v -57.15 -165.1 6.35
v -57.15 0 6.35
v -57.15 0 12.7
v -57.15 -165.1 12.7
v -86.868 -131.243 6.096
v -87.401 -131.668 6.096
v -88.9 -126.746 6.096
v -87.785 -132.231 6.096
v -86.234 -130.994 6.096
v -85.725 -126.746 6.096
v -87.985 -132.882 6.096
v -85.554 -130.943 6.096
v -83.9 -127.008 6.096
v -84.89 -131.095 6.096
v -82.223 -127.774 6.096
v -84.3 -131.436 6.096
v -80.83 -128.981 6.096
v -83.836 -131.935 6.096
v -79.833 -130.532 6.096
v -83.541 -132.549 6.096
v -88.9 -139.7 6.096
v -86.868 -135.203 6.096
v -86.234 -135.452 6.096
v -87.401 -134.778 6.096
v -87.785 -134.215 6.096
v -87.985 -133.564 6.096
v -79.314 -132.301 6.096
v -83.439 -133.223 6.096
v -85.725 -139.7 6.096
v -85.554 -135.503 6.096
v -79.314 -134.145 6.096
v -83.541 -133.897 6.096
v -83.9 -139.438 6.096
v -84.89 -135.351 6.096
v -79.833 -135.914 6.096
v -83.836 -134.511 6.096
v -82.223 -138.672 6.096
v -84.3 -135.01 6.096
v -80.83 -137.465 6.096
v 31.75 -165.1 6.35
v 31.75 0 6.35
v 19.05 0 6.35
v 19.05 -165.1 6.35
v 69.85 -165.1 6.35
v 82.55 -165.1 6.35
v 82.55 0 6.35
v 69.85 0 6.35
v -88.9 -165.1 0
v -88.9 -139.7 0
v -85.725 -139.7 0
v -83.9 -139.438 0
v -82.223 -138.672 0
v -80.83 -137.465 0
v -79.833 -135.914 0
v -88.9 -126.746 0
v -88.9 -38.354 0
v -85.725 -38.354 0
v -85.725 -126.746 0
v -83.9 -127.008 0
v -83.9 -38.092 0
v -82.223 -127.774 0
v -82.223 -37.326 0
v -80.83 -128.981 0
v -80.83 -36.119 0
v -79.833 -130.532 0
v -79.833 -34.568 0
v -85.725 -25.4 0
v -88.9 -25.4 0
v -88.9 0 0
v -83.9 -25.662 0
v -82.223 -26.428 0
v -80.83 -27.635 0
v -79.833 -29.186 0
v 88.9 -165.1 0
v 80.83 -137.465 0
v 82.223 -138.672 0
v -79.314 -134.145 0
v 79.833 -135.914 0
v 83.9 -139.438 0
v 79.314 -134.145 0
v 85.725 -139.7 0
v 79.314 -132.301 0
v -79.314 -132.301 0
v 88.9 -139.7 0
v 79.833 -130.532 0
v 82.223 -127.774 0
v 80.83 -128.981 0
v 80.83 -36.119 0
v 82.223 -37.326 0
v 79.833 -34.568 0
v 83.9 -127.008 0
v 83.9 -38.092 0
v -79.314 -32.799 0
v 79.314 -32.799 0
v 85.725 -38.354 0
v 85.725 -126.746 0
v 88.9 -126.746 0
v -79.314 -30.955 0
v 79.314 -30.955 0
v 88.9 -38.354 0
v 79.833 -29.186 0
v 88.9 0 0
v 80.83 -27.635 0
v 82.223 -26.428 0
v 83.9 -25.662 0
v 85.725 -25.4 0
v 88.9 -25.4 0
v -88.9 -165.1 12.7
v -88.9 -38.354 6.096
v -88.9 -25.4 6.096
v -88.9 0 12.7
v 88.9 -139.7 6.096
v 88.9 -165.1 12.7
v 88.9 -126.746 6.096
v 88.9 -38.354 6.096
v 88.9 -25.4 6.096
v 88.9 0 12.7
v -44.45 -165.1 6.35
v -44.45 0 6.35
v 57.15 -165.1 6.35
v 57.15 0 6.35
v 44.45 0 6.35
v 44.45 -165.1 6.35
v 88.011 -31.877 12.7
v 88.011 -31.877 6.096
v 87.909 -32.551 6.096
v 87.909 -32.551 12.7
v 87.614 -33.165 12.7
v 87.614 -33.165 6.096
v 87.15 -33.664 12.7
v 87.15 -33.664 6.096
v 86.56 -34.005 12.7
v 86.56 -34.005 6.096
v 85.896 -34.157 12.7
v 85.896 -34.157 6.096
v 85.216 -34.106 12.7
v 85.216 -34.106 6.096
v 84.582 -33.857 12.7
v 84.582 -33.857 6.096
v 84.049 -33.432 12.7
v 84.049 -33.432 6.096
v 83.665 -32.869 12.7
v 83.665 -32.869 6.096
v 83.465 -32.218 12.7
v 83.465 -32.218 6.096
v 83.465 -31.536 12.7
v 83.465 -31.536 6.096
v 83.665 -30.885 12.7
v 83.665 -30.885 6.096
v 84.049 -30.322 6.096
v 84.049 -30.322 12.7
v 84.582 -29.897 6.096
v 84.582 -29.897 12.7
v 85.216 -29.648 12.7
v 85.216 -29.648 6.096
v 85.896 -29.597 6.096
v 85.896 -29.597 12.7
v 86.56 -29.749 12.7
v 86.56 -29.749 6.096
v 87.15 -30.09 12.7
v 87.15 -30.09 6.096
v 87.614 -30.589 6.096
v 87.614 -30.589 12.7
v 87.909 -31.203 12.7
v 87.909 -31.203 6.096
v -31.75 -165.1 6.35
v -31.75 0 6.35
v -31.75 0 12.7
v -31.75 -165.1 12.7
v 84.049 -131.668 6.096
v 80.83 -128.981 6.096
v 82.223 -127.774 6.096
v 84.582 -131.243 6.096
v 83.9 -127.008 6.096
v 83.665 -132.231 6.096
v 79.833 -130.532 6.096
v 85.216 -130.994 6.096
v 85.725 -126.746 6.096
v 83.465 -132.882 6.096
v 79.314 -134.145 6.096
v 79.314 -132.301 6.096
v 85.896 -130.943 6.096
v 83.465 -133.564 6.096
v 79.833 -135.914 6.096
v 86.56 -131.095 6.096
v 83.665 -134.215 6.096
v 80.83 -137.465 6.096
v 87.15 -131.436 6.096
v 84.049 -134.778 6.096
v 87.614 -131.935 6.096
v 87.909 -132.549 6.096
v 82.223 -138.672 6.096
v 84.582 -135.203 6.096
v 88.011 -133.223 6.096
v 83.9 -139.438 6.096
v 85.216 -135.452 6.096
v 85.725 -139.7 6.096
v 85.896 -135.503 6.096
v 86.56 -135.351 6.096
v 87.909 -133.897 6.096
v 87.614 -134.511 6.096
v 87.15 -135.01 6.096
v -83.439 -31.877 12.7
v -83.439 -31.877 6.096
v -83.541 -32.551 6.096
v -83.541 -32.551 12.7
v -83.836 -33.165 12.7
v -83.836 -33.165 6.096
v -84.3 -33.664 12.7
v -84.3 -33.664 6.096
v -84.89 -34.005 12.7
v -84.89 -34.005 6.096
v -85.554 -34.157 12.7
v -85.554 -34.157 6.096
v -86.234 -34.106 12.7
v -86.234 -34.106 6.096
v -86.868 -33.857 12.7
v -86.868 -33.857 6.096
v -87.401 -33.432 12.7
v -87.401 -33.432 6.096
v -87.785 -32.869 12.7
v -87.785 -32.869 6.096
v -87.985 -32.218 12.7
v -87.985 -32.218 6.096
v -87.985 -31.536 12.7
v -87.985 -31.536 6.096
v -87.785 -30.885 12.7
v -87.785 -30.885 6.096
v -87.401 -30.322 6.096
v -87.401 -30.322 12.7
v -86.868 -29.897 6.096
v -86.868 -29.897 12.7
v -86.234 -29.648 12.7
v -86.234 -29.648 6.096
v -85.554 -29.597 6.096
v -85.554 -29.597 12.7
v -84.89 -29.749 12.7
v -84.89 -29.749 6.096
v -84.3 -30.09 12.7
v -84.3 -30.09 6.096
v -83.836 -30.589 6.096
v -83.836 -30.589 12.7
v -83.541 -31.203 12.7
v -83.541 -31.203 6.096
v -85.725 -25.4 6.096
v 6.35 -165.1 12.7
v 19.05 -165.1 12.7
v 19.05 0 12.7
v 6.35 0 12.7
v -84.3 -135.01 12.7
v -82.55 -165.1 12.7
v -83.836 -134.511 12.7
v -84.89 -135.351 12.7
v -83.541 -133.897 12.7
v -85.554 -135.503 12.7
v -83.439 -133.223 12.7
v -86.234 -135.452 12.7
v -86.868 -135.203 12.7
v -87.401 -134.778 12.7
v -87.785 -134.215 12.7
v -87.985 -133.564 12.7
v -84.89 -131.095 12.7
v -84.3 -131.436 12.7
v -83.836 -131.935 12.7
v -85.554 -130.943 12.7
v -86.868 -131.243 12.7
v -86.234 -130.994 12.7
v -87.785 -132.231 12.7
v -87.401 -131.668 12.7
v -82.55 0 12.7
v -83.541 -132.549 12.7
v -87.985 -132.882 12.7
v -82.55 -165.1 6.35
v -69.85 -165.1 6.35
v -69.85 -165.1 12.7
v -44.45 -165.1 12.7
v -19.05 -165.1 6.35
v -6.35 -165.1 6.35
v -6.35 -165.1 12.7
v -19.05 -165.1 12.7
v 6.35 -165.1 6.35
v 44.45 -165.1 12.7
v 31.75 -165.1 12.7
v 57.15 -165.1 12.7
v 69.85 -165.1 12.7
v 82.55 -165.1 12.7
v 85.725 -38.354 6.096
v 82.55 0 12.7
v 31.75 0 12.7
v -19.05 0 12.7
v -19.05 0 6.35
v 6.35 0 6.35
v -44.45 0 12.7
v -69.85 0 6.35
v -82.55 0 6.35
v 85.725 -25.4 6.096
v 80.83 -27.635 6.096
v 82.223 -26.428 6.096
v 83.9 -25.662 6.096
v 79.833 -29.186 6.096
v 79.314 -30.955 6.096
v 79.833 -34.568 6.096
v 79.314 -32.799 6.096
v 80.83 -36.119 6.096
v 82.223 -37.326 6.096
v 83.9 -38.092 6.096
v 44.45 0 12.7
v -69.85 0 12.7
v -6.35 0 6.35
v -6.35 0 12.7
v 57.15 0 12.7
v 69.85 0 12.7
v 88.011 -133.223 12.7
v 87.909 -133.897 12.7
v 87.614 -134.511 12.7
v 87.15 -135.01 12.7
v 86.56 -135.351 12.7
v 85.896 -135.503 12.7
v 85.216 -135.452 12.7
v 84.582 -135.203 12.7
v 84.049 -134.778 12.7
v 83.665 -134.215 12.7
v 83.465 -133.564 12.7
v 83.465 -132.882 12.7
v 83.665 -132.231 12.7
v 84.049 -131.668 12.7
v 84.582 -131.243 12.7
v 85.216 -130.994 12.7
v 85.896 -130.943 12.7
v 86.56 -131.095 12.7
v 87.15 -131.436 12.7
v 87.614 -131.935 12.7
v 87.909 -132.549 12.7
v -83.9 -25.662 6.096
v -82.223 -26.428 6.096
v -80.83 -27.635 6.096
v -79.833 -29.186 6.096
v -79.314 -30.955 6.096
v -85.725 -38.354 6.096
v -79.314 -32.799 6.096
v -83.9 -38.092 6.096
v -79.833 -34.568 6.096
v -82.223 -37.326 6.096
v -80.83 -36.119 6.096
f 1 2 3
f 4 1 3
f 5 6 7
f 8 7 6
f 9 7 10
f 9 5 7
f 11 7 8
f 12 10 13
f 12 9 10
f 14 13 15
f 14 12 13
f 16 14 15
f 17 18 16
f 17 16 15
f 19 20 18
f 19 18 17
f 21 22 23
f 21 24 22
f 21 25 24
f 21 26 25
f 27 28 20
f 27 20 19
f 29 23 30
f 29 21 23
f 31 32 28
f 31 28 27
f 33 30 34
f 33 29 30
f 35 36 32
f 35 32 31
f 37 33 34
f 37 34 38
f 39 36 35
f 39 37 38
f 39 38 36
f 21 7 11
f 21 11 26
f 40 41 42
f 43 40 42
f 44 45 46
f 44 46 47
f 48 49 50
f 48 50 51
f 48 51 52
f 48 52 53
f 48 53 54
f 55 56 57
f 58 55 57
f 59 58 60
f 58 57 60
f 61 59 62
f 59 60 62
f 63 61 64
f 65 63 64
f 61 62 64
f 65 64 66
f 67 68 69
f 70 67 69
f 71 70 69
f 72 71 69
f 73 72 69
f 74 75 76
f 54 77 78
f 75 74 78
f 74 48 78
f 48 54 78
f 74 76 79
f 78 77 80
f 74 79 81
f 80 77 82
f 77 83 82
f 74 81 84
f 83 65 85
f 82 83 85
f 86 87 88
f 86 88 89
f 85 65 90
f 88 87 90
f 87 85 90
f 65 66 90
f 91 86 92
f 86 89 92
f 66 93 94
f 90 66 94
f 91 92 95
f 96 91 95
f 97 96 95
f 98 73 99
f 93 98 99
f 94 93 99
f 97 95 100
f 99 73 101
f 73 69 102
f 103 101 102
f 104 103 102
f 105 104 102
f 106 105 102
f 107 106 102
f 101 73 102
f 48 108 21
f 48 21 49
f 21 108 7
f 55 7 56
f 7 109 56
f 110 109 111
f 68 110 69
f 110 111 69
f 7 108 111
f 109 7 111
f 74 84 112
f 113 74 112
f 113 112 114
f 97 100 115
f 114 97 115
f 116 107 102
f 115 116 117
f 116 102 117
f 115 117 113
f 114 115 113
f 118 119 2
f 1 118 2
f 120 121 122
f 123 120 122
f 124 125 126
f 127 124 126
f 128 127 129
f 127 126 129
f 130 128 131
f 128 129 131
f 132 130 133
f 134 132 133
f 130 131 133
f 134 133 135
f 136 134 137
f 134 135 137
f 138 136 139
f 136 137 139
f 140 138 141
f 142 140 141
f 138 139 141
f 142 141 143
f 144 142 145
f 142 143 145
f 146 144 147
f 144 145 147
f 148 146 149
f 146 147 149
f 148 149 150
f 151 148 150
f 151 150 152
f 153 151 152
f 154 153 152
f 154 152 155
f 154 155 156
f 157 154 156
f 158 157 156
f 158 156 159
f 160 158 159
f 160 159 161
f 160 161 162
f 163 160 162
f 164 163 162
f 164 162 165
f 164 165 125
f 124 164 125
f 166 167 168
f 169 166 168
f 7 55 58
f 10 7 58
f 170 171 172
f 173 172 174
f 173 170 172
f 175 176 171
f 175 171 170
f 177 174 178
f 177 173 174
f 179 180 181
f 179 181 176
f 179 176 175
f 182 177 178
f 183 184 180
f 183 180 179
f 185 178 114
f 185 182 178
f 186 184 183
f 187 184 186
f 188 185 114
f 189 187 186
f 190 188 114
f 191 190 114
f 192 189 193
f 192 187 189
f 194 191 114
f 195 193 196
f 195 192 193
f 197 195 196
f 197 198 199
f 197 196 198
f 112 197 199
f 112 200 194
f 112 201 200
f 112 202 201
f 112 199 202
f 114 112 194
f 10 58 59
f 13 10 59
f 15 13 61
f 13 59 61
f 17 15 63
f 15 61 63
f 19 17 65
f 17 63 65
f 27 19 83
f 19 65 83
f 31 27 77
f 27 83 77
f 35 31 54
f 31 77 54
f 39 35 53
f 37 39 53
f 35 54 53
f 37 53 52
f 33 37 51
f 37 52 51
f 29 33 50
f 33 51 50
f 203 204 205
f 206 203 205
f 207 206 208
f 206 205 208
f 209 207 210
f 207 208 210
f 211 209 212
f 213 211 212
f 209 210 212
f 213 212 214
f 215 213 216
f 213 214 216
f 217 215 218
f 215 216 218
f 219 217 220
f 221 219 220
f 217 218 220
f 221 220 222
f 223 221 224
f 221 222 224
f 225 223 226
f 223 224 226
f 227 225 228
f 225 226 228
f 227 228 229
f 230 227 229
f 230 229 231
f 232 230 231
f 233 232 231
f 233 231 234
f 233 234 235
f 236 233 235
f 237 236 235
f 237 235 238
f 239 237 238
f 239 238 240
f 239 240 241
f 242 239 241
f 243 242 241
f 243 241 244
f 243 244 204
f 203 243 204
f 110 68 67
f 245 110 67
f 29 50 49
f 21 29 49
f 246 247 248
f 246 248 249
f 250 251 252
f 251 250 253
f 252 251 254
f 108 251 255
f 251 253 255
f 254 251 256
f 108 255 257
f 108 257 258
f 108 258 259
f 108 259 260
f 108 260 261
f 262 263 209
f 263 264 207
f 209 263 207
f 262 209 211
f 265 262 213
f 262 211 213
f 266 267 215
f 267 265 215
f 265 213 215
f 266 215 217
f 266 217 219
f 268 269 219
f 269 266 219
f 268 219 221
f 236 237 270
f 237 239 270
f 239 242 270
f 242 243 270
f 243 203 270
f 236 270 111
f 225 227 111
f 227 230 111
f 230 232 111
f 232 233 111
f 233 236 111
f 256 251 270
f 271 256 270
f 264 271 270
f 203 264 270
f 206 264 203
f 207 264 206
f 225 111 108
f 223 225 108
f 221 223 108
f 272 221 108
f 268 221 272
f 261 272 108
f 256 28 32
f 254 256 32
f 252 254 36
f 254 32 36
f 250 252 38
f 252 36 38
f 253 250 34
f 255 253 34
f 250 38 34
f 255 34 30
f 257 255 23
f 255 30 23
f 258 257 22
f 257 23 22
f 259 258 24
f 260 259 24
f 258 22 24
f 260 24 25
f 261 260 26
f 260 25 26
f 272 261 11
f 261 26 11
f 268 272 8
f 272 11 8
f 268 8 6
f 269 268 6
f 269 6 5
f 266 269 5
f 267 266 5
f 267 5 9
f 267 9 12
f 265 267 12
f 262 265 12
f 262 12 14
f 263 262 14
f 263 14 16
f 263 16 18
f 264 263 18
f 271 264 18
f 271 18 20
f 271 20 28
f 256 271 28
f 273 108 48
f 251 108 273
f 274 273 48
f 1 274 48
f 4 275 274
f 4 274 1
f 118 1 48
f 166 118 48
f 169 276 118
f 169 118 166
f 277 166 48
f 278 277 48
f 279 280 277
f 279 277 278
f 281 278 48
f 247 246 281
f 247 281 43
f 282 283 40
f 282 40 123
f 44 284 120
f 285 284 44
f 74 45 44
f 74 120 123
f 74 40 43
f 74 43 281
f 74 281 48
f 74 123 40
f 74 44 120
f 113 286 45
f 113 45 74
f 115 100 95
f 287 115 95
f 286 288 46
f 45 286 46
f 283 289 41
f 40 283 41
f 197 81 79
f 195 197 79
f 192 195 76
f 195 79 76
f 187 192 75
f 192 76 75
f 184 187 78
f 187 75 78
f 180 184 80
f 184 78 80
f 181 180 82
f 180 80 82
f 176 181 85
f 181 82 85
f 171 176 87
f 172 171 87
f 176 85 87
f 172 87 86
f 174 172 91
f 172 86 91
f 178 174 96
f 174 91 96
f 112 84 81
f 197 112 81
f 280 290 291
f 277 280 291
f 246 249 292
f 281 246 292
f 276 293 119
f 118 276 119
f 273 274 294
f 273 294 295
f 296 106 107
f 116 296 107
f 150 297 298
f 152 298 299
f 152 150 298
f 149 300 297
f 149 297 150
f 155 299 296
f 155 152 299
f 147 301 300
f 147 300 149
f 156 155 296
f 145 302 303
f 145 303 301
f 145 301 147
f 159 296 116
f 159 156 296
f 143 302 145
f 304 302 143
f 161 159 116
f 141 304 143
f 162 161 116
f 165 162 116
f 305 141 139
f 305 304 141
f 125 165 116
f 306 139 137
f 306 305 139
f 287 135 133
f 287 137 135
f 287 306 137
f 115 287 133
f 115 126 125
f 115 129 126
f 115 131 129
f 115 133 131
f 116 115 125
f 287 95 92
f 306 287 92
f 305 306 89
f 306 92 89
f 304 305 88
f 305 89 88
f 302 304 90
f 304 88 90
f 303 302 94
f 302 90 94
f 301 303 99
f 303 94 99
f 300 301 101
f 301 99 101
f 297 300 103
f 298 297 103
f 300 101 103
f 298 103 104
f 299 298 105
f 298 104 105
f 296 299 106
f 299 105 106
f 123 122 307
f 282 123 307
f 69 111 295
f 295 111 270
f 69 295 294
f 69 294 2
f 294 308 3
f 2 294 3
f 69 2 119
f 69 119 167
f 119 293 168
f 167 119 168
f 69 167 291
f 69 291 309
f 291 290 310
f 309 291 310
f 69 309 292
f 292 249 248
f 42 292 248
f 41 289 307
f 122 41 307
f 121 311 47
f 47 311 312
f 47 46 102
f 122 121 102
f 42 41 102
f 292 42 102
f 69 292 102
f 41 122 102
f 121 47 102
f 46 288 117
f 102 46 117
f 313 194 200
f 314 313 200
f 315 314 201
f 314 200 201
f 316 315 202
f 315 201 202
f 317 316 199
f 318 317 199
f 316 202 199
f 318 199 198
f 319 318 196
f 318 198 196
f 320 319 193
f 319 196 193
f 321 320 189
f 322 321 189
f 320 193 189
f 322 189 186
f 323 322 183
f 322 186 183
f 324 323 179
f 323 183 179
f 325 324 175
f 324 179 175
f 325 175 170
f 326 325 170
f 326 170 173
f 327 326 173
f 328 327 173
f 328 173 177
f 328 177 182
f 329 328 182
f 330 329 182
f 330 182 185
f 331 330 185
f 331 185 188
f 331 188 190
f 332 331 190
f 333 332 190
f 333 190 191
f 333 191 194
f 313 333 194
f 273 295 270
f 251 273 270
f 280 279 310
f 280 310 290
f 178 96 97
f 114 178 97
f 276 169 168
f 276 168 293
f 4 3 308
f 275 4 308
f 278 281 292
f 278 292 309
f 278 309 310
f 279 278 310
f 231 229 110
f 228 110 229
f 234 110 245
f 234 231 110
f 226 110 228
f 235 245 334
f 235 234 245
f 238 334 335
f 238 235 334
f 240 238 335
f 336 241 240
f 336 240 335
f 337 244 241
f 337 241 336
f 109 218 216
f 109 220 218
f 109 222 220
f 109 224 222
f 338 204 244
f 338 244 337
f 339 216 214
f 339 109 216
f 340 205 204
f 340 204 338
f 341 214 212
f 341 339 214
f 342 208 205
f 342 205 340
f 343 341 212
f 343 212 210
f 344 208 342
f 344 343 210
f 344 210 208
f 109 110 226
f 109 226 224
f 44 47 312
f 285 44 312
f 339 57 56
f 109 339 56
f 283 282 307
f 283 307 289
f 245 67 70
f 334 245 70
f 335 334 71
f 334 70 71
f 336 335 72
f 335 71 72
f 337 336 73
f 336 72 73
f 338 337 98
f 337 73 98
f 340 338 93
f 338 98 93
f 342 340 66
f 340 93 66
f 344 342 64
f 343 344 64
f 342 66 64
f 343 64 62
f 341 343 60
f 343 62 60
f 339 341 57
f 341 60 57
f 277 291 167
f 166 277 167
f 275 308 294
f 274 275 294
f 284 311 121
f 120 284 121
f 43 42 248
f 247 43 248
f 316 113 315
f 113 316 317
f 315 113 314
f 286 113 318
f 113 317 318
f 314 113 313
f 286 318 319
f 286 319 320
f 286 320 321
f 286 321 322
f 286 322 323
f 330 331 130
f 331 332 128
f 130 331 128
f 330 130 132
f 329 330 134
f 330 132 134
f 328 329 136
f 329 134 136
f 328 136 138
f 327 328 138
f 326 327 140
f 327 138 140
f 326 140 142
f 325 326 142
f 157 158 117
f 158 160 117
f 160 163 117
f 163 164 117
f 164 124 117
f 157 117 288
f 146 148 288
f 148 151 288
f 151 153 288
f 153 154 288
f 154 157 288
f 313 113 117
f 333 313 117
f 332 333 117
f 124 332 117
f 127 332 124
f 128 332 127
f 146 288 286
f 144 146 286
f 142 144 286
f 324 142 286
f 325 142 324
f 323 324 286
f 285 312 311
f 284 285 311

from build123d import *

# Parameters (mm, degrees)
F1_DEPTH = 165.1
F3_DEPTH = 6.096
F4_R     = 2.286
F5_DEPTH = 25.4


with BuildPart() as f1:
    # F0 (on Front) → F1 (new body)
    with BuildSketch(Plane.XZ):
        Polygon((-88.9, 12.7), (-88.9, 0), (88.9, 0), (88.9, 6.35), (88.9, 12.7), (82.55, 12.7), (82.55, 6.35), (69.85, 6.35), (69.85, 12.7), (57.15, 12.7), (57.15, 6.35), (44.45, 6.35), (44.45, 12.7), (31.75, 12.7), (31.75, 6.35), (19.05, 6.35), (19.05, 12.7), (6.35, 12.7), (6.35, 6.35), (-6.35, 6.35), (-6.35, 12.7), (-19.05, 12.7), (-19.05, 6.35), (-31.75, 6.35), (-31.75, 12.7), (-44.45, 12.7), (-44.45, 6.35), (-57.15, 6.35), (-57.15, 12.7), (-69.85, 12.7), (-69.85, 6.35), (-82.55, 6.35), (-82.55, 12.7), align=None)
    extrude(amount=F1_DEPTH)

    # F2 (on face) → F3 (cut)
    with BuildSketch(Plane(origin=(0, 0, 0), x_dir=(1, 0, 0), z_dir=(0, 0, -1))):
        with BuildLine():
            Line((85.725, 126.746), (88.9, 126.746))
            Line((88.9, 126.746), (88.9, 139.7))
            Line((88.9, 139.7), (85.725, 139.7))
            ThreePointArc((85.725, 139.7), (79.248, 133.223), (85.725, 126.746))
        make_face()
        with BuildLine():
            Line((88.9, 25.4), (88.9, 38.354))
            Line((88.9, 38.354), (85.725, 38.354))
            ThreePointArc((85.725, 38.354), (79.248, 31.877), (85.725, 25.4))
            Line((85.725, 25.4), (88.9, 25.4))
        make_face()
        with BuildLine():
            Line((-88.9, 139.7), (-88.9, 126.746))
            Line((-88.9, 126.746), (-85.725, 126.746))
            ThreePointArc((-85.725, 126.746), (-79.248, 133.223), (-85.725, 139.7))
            Line((-85.725, 139.7), (-88.9, 139.7))
        make_face()
        with BuildLine():
            Line((-85.725, 38.354), (-88.9, 38.354))
            Line((-88.9, 38.354), (-88.9, 25.4))
            Line((-88.9, 25.4), (-85.725, 25.4))
            ThreePointArc((-85.725, 25.4), (-79.248, 31.877), (-85.725, 38.354))
        make_face()
    extrude(amount=-F3_DEPTH, mode=Mode.SUBTRACT)

    # F4 (on face) → F5 (cut)
    with BuildSketch(Plane(origin=(0, 0, 0), x_dir=(1, 0, 0), z_dir=(0, 0, -1))):
        with Locations((-85.725, 133.223)):
            Circle(F4_R)
        with Locations((85.725, 133.223)):
            Circle(F4_R)
        with Locations((85.725, 31.877)):
            Circle(F4_R)
        with Locations((-85.725, 31.877)):
            Circle(F4_R)
    extrude(amount=-F5_DEPTH, mode=Mode.SUBTRACT)


solid = f1.part
